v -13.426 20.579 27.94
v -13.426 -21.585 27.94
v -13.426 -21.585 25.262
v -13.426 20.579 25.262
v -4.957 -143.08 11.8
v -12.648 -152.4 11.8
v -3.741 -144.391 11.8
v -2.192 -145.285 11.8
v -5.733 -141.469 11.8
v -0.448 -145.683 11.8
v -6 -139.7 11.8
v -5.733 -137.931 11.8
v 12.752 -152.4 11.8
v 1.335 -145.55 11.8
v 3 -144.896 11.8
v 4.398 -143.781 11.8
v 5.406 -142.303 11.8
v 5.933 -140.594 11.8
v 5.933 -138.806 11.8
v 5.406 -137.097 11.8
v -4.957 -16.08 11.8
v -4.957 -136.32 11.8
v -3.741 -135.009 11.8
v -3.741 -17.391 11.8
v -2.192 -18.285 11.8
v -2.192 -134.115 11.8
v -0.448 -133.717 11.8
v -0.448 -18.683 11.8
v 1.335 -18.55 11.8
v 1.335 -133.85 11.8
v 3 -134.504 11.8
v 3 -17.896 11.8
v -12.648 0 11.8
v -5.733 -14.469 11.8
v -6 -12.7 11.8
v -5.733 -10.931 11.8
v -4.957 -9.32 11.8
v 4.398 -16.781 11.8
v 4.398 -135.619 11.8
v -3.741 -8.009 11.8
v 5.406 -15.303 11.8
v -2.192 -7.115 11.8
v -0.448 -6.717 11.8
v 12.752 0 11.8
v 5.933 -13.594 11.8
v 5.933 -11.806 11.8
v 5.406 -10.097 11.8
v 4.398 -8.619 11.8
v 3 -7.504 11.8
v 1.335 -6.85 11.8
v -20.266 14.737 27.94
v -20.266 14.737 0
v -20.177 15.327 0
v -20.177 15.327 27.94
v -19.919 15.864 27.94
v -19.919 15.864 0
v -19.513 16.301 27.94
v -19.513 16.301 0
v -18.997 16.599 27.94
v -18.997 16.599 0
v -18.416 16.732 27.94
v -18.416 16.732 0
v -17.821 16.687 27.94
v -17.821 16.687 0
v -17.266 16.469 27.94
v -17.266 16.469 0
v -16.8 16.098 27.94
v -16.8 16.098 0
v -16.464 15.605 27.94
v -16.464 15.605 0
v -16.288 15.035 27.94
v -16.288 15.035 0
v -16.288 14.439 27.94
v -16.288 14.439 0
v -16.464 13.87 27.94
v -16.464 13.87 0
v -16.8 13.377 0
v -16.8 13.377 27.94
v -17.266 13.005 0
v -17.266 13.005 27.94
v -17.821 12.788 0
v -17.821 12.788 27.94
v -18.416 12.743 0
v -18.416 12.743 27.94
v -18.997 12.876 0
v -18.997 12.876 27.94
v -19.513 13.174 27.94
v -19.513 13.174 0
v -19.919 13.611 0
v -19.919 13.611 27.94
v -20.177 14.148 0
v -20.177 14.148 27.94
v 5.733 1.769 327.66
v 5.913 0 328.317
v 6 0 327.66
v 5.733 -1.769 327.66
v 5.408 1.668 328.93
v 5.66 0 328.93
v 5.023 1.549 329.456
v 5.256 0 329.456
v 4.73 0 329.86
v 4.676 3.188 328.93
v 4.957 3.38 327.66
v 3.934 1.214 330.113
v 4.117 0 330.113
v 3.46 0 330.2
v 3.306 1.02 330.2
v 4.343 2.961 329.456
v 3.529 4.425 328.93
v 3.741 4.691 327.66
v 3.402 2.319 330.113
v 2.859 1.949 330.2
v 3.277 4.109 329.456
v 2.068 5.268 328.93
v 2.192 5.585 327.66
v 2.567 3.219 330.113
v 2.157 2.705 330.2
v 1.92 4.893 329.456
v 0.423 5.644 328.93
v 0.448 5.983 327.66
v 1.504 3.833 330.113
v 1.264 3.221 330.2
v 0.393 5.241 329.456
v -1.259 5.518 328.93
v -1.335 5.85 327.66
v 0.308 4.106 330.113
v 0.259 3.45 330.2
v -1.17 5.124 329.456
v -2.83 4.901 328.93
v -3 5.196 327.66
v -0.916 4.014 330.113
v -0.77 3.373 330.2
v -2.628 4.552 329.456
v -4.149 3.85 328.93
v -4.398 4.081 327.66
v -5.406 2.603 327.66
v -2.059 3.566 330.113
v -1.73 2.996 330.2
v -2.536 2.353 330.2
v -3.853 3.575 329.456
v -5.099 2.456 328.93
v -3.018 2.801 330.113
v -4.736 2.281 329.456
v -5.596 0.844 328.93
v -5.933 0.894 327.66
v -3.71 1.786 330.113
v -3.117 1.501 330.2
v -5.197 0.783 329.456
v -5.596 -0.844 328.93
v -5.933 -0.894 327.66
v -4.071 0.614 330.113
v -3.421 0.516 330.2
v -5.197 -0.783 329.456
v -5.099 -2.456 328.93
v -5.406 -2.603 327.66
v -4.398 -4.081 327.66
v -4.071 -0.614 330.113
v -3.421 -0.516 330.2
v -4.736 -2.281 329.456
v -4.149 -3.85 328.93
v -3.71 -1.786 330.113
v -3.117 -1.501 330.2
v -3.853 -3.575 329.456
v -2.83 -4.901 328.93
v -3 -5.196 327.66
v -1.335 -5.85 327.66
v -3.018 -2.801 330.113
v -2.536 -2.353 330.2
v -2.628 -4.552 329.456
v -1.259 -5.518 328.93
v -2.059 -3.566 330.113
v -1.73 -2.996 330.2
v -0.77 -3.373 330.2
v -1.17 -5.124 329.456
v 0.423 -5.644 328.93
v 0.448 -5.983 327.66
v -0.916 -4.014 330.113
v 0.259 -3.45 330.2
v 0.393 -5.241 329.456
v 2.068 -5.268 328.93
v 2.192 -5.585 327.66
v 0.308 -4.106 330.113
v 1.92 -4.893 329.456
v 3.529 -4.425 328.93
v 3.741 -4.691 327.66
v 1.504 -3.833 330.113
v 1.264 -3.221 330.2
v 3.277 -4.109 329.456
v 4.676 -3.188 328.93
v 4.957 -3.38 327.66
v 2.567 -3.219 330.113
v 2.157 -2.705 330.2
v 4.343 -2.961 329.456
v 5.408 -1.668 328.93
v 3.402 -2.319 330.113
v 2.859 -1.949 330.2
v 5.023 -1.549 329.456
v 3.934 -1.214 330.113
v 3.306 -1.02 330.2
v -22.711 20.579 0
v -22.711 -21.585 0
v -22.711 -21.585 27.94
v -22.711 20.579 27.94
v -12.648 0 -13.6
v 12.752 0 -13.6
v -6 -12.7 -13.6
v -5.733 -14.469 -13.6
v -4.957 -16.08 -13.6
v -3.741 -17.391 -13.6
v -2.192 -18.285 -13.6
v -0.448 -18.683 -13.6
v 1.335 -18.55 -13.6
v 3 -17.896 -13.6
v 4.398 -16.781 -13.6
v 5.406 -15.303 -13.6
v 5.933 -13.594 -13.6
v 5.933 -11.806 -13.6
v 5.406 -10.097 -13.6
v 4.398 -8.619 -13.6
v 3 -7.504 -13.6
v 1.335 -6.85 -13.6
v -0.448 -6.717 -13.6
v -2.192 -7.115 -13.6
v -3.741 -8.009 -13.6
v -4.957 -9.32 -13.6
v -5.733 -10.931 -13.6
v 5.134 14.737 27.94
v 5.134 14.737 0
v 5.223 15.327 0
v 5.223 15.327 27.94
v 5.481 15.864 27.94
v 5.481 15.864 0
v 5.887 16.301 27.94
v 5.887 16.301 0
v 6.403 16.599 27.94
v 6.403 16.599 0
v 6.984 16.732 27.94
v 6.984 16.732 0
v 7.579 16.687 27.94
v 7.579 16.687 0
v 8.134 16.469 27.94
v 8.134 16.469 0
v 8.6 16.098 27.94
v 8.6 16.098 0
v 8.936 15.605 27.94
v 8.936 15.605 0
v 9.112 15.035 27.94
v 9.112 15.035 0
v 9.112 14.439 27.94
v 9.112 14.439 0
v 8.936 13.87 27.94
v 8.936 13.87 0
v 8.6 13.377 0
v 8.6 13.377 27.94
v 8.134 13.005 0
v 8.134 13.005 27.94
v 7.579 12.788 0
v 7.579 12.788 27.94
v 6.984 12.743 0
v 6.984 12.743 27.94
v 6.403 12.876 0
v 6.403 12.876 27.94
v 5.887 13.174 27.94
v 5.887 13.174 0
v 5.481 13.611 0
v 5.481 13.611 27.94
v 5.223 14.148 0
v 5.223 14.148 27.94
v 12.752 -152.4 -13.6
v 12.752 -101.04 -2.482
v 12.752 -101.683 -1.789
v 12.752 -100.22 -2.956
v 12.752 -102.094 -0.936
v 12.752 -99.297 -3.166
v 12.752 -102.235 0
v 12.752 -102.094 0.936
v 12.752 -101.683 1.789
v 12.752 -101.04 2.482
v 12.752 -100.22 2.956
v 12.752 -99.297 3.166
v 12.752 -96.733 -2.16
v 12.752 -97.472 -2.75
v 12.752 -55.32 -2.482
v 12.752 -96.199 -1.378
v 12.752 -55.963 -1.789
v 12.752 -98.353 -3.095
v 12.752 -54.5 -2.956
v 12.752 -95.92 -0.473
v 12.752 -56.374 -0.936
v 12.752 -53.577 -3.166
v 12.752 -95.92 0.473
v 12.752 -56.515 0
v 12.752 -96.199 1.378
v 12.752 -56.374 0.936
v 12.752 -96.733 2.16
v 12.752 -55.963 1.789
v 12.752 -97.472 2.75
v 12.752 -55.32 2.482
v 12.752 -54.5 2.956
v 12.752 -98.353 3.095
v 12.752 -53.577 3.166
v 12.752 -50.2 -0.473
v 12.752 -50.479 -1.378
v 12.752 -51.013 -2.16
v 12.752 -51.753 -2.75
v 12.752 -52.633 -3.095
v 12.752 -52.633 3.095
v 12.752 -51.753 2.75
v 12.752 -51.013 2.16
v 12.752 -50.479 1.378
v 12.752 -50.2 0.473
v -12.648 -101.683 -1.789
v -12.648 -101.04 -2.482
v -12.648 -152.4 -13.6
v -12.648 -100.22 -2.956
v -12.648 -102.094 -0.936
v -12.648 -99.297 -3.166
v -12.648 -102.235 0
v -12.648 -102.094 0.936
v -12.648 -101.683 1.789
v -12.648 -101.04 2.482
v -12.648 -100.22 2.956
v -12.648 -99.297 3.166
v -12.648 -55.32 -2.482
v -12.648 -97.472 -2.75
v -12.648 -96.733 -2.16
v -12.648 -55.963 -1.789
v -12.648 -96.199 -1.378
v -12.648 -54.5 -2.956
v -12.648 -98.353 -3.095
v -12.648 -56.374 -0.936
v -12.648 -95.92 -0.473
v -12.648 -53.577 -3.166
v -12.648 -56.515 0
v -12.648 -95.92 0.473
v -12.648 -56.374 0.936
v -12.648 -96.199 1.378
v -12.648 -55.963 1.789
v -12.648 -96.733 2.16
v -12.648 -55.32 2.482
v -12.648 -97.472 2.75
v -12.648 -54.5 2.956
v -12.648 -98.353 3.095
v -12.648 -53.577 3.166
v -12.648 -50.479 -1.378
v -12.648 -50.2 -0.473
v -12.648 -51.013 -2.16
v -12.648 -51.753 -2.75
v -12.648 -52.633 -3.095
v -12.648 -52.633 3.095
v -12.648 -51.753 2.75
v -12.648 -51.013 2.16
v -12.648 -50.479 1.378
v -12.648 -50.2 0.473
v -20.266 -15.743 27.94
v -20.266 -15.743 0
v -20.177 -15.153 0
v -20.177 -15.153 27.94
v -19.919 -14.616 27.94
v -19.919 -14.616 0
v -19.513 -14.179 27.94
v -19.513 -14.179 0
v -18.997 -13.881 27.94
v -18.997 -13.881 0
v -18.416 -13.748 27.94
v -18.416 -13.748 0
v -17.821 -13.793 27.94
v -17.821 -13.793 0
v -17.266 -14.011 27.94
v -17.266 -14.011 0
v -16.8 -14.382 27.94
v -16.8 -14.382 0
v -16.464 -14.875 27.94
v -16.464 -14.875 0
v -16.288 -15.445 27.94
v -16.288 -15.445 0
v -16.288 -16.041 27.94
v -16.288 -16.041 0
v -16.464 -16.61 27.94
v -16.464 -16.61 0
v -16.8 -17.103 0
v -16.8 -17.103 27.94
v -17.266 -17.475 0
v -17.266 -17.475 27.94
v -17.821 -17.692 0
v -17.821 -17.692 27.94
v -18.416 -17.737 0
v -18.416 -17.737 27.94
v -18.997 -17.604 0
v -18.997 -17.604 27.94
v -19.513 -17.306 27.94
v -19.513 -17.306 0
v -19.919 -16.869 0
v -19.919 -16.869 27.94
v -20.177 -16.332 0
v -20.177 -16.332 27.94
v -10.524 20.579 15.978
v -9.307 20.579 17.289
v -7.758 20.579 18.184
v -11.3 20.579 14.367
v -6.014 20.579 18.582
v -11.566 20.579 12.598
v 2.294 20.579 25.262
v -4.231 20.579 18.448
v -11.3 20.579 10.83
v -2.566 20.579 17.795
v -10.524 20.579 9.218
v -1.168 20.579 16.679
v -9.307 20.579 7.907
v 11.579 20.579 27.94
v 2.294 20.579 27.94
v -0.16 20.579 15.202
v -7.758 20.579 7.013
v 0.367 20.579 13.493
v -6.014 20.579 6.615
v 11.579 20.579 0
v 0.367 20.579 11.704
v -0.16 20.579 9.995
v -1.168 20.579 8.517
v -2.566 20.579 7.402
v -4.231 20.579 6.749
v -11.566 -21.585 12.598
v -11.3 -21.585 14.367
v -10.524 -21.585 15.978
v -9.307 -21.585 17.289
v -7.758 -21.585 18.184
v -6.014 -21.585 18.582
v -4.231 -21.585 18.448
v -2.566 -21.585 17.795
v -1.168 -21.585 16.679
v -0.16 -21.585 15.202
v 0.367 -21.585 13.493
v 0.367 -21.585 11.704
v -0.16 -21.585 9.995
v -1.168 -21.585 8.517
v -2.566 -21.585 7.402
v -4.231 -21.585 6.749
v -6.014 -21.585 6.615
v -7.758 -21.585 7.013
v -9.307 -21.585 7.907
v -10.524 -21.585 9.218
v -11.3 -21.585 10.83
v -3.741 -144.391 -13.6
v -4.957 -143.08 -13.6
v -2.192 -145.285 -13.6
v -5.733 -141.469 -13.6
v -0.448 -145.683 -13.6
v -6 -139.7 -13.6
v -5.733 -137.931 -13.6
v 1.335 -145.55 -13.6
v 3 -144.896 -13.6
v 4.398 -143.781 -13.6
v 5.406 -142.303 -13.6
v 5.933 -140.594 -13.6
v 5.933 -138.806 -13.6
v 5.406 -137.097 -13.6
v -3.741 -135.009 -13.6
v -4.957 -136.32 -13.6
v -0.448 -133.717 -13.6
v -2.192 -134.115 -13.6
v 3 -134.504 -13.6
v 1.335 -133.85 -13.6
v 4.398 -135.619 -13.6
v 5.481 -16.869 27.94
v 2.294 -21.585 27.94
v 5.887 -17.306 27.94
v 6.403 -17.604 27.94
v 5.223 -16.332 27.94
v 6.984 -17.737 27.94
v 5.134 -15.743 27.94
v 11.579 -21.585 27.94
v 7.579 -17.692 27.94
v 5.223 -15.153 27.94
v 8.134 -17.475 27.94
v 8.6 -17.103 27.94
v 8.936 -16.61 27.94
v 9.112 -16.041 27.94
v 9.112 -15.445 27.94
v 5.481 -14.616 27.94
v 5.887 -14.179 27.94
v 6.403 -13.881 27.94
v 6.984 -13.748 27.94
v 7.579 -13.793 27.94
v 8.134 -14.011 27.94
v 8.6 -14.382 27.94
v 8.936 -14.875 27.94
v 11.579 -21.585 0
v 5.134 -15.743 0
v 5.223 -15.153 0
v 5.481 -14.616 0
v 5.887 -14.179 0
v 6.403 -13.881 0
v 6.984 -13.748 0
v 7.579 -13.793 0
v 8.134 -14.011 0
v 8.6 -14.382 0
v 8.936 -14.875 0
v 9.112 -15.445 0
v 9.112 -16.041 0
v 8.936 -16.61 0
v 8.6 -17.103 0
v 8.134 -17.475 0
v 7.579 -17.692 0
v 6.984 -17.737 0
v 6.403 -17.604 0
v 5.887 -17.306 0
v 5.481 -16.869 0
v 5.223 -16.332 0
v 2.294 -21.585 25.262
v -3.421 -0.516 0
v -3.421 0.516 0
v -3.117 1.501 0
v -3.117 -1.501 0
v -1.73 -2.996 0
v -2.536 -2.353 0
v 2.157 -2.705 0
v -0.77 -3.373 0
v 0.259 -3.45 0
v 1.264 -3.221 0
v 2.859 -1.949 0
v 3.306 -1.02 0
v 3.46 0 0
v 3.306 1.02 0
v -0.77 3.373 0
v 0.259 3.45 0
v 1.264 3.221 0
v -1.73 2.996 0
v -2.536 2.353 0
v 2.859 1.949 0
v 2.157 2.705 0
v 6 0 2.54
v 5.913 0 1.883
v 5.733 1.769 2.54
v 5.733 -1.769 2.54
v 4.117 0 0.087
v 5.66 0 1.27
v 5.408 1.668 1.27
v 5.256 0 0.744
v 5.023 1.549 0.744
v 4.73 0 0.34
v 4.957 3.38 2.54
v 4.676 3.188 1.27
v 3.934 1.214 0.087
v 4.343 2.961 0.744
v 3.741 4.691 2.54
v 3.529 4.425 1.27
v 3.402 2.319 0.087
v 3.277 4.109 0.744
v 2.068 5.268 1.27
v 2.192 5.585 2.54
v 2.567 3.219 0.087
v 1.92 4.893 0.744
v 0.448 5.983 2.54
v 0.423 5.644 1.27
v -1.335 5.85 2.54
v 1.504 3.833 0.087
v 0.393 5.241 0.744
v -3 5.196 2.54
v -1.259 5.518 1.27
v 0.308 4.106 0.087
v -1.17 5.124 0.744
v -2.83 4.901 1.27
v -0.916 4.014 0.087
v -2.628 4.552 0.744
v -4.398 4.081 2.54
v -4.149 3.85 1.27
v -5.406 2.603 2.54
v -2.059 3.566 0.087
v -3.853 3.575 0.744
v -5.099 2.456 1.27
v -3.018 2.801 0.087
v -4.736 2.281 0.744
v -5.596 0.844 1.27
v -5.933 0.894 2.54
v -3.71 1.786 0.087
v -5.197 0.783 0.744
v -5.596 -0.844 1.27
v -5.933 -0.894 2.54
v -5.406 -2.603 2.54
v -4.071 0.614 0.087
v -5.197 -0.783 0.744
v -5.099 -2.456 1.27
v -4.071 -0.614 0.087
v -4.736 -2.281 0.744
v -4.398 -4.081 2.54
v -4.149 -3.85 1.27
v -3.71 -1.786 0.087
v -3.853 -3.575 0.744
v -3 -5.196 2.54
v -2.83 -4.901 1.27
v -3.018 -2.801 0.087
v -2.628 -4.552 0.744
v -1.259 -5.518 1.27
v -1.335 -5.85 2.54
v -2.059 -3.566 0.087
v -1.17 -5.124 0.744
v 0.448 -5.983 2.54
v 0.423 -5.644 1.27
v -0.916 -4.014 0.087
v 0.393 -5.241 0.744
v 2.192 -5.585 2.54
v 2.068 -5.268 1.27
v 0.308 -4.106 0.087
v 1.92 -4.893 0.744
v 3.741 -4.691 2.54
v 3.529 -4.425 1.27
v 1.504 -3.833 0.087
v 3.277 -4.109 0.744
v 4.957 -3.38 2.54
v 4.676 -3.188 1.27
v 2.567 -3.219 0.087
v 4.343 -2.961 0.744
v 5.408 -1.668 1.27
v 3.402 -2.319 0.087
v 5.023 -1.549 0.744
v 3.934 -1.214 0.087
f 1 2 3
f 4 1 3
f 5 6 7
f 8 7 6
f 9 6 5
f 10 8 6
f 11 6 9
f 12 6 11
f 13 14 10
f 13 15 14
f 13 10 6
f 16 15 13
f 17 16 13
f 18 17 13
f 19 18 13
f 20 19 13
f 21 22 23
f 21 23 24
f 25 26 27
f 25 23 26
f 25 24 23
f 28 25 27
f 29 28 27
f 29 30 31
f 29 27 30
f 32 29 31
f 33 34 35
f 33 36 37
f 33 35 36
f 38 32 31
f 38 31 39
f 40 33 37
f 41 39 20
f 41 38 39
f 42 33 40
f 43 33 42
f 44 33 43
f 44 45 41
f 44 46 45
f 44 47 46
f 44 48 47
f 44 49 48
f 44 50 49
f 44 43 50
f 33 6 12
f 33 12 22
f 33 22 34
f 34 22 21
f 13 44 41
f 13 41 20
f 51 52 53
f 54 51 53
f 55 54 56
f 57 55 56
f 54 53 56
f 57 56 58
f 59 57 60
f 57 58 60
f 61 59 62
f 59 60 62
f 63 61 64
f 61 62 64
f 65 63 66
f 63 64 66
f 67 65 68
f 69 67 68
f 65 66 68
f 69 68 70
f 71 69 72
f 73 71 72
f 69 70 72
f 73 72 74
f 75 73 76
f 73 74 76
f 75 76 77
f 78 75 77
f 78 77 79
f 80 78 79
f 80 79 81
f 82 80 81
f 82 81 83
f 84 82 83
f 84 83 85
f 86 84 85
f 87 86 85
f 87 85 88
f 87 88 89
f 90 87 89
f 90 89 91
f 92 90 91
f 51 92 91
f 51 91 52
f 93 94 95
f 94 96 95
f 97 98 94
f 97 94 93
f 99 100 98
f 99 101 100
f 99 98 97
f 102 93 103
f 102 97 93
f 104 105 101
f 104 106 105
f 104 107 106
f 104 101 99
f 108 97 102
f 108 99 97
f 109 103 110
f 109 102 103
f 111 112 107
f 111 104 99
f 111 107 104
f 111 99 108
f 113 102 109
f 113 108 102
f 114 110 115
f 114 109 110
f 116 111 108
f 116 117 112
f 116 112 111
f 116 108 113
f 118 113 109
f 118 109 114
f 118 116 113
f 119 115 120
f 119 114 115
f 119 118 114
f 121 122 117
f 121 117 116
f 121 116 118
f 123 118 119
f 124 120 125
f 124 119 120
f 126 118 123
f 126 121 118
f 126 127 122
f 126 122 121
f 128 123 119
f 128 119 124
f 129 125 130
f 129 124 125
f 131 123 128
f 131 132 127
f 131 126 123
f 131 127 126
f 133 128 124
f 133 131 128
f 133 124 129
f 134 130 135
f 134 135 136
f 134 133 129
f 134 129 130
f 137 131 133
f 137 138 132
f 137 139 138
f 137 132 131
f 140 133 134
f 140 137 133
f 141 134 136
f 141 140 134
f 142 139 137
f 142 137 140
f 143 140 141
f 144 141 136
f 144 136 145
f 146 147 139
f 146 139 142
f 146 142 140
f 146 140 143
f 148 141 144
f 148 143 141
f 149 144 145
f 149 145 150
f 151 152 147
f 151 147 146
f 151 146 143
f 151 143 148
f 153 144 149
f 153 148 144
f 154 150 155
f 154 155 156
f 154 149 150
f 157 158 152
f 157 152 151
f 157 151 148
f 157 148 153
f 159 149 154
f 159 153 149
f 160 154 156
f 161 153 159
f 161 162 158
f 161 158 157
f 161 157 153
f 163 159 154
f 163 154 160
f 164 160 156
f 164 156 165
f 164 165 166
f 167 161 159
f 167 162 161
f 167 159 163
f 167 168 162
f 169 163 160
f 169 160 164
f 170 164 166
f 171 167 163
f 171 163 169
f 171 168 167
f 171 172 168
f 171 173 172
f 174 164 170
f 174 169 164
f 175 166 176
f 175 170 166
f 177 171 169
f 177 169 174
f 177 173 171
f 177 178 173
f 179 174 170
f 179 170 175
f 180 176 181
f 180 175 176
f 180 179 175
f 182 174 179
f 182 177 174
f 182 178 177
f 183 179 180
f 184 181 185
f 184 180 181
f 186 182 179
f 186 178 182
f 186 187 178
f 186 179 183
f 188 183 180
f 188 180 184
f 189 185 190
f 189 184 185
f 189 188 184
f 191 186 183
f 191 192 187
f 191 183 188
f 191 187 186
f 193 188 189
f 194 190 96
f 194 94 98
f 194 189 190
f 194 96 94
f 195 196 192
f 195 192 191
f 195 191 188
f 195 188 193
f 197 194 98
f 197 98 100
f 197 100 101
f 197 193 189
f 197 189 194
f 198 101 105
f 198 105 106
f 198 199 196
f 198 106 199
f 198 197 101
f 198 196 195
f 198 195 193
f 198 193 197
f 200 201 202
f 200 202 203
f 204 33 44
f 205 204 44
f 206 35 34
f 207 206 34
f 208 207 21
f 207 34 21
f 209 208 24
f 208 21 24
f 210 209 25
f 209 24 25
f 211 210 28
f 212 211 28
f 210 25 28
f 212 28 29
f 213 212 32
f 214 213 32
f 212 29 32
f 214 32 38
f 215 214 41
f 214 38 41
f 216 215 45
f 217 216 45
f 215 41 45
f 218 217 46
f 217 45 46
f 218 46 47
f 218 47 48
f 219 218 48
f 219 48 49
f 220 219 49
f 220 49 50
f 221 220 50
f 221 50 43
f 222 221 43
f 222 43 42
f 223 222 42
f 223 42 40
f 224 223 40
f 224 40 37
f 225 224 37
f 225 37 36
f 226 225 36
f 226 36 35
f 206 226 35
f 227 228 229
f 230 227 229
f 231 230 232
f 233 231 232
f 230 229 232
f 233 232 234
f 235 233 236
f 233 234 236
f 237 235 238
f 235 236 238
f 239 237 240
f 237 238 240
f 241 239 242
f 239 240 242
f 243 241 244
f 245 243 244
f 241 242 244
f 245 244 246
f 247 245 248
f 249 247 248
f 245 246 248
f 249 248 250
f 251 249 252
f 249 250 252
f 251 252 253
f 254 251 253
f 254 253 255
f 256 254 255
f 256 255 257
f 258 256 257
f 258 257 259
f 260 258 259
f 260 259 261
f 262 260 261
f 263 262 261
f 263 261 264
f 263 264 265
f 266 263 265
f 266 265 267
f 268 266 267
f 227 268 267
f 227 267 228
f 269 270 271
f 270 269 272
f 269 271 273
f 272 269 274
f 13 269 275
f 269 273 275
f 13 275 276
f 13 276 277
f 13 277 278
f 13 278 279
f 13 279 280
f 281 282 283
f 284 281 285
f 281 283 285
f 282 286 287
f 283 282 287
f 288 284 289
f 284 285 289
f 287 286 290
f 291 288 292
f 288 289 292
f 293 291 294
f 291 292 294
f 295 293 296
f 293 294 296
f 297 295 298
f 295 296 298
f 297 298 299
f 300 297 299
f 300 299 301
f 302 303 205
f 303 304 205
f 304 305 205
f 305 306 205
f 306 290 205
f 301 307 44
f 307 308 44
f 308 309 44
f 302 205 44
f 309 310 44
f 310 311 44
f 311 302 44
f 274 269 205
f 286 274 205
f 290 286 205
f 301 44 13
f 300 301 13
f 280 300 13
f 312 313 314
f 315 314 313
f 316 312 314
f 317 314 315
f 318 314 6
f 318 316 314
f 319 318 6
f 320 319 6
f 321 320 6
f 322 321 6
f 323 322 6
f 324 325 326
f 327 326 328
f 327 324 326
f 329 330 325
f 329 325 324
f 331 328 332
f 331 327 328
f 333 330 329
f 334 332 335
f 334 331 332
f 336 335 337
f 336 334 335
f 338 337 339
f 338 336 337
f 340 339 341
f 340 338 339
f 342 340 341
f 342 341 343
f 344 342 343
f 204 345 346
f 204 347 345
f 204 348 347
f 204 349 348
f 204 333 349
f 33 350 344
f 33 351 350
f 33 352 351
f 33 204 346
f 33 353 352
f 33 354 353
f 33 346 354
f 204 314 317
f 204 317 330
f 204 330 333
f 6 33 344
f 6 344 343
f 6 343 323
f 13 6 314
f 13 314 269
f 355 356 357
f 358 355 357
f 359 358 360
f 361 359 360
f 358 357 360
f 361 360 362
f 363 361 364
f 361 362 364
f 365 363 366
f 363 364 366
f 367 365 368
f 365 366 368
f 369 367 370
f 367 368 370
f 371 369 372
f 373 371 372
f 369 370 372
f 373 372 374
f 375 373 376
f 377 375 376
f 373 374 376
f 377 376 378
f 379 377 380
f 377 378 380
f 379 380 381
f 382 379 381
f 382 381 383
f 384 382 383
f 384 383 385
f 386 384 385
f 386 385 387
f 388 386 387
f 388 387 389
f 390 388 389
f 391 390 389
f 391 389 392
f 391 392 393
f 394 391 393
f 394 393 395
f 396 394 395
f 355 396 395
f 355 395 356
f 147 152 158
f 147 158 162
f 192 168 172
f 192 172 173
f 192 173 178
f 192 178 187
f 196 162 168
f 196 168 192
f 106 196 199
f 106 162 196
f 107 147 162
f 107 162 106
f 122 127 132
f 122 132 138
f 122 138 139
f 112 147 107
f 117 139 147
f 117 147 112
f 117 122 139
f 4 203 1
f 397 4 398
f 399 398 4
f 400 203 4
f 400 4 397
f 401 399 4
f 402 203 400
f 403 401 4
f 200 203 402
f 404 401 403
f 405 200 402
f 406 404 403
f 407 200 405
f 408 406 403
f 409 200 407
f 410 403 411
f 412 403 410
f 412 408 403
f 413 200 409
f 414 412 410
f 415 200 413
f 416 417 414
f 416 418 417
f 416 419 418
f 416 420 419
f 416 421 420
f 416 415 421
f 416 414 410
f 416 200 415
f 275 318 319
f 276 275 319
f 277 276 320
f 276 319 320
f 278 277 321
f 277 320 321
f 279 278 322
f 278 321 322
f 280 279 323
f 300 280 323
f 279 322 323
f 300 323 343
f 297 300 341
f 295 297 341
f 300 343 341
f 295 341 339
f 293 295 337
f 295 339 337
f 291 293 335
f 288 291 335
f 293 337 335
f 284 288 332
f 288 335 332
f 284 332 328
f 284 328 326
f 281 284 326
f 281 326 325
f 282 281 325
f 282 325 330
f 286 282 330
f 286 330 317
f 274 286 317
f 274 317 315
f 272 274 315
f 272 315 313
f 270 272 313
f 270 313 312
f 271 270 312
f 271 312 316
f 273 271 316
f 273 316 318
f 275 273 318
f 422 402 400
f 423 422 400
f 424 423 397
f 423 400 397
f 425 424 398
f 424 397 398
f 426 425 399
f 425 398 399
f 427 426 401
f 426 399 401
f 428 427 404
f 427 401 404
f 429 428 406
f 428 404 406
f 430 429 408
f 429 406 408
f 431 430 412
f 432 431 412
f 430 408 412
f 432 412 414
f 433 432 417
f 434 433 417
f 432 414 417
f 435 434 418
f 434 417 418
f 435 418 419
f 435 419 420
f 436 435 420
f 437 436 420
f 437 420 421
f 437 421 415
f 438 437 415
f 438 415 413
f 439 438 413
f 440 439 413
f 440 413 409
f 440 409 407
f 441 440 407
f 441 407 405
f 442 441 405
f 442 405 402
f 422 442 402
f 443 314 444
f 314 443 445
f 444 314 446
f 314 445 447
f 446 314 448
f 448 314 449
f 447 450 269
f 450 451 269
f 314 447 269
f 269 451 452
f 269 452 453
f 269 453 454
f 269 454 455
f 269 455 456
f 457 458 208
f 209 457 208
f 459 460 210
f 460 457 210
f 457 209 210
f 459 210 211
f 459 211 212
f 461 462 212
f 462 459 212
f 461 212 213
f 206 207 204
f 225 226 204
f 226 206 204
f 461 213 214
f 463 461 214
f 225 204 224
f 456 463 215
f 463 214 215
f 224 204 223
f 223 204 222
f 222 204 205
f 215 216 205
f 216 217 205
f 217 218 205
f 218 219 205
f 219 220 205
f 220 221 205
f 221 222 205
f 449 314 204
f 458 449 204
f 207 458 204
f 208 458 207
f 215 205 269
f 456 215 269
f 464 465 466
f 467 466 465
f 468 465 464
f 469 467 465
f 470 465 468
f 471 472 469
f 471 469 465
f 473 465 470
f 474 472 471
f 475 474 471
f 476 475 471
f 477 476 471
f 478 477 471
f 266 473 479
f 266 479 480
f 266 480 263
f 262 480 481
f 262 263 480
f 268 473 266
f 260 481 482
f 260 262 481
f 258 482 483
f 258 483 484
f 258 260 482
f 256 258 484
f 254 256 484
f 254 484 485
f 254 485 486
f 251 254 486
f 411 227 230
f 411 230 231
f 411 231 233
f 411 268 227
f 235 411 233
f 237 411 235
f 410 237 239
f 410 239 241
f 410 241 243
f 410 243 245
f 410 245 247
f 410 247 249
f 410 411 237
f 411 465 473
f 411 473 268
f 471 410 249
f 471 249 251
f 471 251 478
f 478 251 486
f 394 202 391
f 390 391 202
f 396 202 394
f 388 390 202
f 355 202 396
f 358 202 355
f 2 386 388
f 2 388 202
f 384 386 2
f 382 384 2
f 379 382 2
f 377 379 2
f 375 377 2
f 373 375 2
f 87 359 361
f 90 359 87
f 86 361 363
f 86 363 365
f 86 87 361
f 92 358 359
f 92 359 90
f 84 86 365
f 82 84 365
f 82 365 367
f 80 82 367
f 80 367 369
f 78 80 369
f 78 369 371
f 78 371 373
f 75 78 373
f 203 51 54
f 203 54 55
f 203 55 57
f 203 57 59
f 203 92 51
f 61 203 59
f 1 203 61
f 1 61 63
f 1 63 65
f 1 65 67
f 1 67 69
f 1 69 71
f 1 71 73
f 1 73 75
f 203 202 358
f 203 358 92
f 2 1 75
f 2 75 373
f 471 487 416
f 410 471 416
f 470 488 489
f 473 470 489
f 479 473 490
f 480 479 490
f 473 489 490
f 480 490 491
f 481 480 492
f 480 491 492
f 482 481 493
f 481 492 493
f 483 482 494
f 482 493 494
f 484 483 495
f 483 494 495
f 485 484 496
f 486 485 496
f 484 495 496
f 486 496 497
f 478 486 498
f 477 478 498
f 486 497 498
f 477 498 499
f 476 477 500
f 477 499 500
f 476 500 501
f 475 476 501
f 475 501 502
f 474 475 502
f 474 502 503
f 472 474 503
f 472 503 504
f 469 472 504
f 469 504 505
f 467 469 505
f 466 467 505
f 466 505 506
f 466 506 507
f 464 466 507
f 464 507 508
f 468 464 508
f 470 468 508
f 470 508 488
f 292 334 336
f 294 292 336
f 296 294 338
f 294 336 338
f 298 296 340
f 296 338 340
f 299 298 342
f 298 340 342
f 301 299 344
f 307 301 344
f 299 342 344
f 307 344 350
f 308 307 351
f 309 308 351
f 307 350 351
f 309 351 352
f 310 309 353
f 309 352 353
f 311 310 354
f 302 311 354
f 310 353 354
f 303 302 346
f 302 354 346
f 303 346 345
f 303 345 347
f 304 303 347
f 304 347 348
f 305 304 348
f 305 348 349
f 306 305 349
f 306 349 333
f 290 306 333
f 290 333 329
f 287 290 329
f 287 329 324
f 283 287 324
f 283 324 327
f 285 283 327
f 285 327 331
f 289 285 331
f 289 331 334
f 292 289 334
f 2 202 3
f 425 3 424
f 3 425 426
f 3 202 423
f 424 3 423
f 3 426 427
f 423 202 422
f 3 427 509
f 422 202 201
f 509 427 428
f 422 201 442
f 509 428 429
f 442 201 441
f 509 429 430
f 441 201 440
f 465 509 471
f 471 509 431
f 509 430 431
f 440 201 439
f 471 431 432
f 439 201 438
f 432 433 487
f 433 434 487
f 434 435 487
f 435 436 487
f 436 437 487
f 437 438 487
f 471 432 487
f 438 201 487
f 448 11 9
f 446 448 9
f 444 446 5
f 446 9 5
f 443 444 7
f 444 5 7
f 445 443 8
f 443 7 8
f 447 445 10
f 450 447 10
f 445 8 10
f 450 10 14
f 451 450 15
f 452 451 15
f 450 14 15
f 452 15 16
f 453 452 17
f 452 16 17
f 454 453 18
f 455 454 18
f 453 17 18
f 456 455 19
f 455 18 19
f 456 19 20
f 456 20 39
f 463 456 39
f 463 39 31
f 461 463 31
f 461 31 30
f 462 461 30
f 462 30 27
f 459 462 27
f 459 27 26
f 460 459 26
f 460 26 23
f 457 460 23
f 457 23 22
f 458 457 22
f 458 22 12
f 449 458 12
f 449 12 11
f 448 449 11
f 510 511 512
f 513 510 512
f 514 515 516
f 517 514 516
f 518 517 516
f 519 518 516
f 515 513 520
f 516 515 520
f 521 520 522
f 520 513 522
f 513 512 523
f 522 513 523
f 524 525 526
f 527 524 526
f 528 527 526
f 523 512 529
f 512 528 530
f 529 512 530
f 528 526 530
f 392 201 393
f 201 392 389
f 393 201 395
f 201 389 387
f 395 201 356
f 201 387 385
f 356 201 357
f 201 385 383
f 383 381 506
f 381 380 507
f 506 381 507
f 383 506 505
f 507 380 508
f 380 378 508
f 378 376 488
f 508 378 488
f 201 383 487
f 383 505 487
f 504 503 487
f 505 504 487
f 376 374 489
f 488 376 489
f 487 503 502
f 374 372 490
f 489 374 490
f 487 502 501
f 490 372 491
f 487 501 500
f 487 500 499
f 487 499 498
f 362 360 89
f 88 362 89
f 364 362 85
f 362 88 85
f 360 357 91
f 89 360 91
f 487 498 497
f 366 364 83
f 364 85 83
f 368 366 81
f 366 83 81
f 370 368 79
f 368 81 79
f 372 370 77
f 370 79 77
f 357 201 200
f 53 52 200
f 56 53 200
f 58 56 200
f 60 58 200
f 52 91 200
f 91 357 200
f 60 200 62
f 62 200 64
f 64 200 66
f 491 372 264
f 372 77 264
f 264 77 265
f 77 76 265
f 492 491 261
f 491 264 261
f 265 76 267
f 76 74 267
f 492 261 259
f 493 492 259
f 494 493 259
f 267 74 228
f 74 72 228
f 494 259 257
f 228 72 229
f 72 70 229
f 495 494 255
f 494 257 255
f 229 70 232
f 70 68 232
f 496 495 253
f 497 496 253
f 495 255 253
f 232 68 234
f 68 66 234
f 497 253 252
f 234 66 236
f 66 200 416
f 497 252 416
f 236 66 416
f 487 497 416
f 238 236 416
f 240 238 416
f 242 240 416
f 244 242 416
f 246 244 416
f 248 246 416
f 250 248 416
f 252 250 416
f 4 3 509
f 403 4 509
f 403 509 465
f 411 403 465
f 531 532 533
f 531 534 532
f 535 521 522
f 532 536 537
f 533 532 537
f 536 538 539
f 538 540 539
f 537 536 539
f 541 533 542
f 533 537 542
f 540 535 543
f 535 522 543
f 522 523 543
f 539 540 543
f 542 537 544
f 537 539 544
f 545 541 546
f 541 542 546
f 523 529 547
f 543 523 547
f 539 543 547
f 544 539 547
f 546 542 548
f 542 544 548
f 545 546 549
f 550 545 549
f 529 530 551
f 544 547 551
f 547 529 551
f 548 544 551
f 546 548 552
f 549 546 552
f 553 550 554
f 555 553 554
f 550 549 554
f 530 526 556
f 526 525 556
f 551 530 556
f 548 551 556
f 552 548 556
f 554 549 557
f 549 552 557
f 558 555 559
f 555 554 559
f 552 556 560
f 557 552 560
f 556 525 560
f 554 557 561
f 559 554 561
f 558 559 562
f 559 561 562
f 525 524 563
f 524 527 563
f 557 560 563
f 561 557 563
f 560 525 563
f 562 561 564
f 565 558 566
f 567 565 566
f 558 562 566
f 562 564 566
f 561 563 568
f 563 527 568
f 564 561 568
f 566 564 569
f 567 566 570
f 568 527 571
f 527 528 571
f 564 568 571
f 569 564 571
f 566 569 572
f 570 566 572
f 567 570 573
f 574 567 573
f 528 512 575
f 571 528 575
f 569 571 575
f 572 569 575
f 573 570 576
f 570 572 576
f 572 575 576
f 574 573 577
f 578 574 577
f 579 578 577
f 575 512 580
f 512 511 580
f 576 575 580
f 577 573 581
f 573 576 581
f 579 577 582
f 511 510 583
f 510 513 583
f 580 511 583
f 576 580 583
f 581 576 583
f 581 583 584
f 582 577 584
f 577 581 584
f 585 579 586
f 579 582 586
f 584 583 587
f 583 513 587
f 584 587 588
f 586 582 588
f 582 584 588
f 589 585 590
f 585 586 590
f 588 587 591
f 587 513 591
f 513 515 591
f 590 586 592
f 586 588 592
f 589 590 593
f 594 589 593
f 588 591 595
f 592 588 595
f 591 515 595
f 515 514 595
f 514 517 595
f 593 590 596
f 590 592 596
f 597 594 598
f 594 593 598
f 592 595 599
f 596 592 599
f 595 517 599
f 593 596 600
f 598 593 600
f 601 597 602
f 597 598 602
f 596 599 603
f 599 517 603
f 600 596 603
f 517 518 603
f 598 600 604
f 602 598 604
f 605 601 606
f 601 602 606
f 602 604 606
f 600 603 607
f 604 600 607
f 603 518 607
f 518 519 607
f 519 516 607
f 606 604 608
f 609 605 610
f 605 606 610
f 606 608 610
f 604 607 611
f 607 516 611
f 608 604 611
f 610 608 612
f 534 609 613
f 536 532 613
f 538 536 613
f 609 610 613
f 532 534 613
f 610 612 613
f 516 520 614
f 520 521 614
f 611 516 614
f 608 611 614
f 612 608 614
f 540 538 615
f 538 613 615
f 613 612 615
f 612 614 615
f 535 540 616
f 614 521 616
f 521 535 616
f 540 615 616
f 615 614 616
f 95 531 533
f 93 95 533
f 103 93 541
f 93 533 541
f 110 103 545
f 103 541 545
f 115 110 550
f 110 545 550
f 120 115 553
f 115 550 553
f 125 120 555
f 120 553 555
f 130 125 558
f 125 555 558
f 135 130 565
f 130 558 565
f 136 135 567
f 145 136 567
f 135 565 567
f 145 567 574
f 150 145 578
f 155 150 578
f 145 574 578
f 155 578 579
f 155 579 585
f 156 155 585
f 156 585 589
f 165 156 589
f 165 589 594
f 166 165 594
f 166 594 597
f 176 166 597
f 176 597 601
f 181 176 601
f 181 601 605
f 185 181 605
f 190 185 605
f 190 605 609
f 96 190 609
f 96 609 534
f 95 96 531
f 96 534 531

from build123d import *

# Parameters (mm, degrees)
F0_R      = 6
F1_DEPTH  = 330.2
F2_R      = 2.54
F3_W      = 25.4
F3_H      = 25.4
F4_DEPTH  = 152.4
F6_D      = 12
F8_D      = 6.35
F9_W      = 34.29
F9_H      = 42.164
F10_DEPTH = 27.94
F12_D     = 4
F14_D     = 12
F15_DEPTH = 42.164


with BuildPart() as f1:
    # F0 (on Top) → F1 (new body)
    with BuildSketch(Plane.XY):
        Circle(F0_R)
    extrude(amount=F1_DEPTH)

    # F2
    f2_edges = [f1.edges().sort_by_distance(p)[0] for p in [
        (-6, 0, 330.2),
        (-6, 0, 0),
    ]]
    fillet(f2_edges, radius=F2_R)


with BuildPart() as f4:
    # F3 (on Front) → F4 (new body)
    with BuildSketch(Plane.XZ):
        with Locations((0.0521343541, -0.9000794962)):
            Rectangle(F3_W, F3_H)
    extrude(amount=F4_DEPTH)

    # F6 (through all)
    with Locations(Plane(origin=(0, 0, -13.6000794962), x_dir=(1, 0, 0), z_dir=(0, 0, -1))):
        with Locations((0, 139.7), (0, 12.7)):
            Hole(F6_D / 2)

    # F8 (through all)
    with Locations(Plane.YZ.offset(12.7521343541)):
        with Locations((-99.06, 0), (-53.34, 0)):
            Hole(F8_D / 2)


with BuildPart() as f10:
    # F9 (on Top) → F10 (new body)
    with BuildSketch(Plane.XY):
        with Locations((-5.5661106151, -0.5026115105)):
            Rectangle(F9_W, F9_H)
    extrude(amount=F10_DEPTH)

    # F12 (through all)
    with Locations(Plane.XY.offset(27.94)):
        with Locations((-18.2661106151, 14.7373884895), (-18.2661106151, -15.7426115105), (7.1338893849, -15.7426115105), (7.1338893849, 14.7373884895)):
            Hole(F12_D / 2)

    # F14 (through all)
    with Locations(Plane.XZ.offset(21.5846115105)):
        with Locations((-5.5661106151, 12.5984)):
            Hole(F14_D / 2)

    # F13 (on face) → F15 (cut, through all)
    with BuildSketch(Plane.XZ.offset(21.5846115105)):
        Polygon((2.294197186, 27.94), (-5.5661106151, 27.94), (-13.4264184162, 27.94), (-13.4264184162, 25.2618864179), (-5.5661106151, 25.2618864179), (2.294197186, 25.2618864179), align=None)
    extrude(amount=-F15_DEPTH, mode=Mode.SUBTRACT)


solid = Compound([f1.part, f4.part, f10.part])
